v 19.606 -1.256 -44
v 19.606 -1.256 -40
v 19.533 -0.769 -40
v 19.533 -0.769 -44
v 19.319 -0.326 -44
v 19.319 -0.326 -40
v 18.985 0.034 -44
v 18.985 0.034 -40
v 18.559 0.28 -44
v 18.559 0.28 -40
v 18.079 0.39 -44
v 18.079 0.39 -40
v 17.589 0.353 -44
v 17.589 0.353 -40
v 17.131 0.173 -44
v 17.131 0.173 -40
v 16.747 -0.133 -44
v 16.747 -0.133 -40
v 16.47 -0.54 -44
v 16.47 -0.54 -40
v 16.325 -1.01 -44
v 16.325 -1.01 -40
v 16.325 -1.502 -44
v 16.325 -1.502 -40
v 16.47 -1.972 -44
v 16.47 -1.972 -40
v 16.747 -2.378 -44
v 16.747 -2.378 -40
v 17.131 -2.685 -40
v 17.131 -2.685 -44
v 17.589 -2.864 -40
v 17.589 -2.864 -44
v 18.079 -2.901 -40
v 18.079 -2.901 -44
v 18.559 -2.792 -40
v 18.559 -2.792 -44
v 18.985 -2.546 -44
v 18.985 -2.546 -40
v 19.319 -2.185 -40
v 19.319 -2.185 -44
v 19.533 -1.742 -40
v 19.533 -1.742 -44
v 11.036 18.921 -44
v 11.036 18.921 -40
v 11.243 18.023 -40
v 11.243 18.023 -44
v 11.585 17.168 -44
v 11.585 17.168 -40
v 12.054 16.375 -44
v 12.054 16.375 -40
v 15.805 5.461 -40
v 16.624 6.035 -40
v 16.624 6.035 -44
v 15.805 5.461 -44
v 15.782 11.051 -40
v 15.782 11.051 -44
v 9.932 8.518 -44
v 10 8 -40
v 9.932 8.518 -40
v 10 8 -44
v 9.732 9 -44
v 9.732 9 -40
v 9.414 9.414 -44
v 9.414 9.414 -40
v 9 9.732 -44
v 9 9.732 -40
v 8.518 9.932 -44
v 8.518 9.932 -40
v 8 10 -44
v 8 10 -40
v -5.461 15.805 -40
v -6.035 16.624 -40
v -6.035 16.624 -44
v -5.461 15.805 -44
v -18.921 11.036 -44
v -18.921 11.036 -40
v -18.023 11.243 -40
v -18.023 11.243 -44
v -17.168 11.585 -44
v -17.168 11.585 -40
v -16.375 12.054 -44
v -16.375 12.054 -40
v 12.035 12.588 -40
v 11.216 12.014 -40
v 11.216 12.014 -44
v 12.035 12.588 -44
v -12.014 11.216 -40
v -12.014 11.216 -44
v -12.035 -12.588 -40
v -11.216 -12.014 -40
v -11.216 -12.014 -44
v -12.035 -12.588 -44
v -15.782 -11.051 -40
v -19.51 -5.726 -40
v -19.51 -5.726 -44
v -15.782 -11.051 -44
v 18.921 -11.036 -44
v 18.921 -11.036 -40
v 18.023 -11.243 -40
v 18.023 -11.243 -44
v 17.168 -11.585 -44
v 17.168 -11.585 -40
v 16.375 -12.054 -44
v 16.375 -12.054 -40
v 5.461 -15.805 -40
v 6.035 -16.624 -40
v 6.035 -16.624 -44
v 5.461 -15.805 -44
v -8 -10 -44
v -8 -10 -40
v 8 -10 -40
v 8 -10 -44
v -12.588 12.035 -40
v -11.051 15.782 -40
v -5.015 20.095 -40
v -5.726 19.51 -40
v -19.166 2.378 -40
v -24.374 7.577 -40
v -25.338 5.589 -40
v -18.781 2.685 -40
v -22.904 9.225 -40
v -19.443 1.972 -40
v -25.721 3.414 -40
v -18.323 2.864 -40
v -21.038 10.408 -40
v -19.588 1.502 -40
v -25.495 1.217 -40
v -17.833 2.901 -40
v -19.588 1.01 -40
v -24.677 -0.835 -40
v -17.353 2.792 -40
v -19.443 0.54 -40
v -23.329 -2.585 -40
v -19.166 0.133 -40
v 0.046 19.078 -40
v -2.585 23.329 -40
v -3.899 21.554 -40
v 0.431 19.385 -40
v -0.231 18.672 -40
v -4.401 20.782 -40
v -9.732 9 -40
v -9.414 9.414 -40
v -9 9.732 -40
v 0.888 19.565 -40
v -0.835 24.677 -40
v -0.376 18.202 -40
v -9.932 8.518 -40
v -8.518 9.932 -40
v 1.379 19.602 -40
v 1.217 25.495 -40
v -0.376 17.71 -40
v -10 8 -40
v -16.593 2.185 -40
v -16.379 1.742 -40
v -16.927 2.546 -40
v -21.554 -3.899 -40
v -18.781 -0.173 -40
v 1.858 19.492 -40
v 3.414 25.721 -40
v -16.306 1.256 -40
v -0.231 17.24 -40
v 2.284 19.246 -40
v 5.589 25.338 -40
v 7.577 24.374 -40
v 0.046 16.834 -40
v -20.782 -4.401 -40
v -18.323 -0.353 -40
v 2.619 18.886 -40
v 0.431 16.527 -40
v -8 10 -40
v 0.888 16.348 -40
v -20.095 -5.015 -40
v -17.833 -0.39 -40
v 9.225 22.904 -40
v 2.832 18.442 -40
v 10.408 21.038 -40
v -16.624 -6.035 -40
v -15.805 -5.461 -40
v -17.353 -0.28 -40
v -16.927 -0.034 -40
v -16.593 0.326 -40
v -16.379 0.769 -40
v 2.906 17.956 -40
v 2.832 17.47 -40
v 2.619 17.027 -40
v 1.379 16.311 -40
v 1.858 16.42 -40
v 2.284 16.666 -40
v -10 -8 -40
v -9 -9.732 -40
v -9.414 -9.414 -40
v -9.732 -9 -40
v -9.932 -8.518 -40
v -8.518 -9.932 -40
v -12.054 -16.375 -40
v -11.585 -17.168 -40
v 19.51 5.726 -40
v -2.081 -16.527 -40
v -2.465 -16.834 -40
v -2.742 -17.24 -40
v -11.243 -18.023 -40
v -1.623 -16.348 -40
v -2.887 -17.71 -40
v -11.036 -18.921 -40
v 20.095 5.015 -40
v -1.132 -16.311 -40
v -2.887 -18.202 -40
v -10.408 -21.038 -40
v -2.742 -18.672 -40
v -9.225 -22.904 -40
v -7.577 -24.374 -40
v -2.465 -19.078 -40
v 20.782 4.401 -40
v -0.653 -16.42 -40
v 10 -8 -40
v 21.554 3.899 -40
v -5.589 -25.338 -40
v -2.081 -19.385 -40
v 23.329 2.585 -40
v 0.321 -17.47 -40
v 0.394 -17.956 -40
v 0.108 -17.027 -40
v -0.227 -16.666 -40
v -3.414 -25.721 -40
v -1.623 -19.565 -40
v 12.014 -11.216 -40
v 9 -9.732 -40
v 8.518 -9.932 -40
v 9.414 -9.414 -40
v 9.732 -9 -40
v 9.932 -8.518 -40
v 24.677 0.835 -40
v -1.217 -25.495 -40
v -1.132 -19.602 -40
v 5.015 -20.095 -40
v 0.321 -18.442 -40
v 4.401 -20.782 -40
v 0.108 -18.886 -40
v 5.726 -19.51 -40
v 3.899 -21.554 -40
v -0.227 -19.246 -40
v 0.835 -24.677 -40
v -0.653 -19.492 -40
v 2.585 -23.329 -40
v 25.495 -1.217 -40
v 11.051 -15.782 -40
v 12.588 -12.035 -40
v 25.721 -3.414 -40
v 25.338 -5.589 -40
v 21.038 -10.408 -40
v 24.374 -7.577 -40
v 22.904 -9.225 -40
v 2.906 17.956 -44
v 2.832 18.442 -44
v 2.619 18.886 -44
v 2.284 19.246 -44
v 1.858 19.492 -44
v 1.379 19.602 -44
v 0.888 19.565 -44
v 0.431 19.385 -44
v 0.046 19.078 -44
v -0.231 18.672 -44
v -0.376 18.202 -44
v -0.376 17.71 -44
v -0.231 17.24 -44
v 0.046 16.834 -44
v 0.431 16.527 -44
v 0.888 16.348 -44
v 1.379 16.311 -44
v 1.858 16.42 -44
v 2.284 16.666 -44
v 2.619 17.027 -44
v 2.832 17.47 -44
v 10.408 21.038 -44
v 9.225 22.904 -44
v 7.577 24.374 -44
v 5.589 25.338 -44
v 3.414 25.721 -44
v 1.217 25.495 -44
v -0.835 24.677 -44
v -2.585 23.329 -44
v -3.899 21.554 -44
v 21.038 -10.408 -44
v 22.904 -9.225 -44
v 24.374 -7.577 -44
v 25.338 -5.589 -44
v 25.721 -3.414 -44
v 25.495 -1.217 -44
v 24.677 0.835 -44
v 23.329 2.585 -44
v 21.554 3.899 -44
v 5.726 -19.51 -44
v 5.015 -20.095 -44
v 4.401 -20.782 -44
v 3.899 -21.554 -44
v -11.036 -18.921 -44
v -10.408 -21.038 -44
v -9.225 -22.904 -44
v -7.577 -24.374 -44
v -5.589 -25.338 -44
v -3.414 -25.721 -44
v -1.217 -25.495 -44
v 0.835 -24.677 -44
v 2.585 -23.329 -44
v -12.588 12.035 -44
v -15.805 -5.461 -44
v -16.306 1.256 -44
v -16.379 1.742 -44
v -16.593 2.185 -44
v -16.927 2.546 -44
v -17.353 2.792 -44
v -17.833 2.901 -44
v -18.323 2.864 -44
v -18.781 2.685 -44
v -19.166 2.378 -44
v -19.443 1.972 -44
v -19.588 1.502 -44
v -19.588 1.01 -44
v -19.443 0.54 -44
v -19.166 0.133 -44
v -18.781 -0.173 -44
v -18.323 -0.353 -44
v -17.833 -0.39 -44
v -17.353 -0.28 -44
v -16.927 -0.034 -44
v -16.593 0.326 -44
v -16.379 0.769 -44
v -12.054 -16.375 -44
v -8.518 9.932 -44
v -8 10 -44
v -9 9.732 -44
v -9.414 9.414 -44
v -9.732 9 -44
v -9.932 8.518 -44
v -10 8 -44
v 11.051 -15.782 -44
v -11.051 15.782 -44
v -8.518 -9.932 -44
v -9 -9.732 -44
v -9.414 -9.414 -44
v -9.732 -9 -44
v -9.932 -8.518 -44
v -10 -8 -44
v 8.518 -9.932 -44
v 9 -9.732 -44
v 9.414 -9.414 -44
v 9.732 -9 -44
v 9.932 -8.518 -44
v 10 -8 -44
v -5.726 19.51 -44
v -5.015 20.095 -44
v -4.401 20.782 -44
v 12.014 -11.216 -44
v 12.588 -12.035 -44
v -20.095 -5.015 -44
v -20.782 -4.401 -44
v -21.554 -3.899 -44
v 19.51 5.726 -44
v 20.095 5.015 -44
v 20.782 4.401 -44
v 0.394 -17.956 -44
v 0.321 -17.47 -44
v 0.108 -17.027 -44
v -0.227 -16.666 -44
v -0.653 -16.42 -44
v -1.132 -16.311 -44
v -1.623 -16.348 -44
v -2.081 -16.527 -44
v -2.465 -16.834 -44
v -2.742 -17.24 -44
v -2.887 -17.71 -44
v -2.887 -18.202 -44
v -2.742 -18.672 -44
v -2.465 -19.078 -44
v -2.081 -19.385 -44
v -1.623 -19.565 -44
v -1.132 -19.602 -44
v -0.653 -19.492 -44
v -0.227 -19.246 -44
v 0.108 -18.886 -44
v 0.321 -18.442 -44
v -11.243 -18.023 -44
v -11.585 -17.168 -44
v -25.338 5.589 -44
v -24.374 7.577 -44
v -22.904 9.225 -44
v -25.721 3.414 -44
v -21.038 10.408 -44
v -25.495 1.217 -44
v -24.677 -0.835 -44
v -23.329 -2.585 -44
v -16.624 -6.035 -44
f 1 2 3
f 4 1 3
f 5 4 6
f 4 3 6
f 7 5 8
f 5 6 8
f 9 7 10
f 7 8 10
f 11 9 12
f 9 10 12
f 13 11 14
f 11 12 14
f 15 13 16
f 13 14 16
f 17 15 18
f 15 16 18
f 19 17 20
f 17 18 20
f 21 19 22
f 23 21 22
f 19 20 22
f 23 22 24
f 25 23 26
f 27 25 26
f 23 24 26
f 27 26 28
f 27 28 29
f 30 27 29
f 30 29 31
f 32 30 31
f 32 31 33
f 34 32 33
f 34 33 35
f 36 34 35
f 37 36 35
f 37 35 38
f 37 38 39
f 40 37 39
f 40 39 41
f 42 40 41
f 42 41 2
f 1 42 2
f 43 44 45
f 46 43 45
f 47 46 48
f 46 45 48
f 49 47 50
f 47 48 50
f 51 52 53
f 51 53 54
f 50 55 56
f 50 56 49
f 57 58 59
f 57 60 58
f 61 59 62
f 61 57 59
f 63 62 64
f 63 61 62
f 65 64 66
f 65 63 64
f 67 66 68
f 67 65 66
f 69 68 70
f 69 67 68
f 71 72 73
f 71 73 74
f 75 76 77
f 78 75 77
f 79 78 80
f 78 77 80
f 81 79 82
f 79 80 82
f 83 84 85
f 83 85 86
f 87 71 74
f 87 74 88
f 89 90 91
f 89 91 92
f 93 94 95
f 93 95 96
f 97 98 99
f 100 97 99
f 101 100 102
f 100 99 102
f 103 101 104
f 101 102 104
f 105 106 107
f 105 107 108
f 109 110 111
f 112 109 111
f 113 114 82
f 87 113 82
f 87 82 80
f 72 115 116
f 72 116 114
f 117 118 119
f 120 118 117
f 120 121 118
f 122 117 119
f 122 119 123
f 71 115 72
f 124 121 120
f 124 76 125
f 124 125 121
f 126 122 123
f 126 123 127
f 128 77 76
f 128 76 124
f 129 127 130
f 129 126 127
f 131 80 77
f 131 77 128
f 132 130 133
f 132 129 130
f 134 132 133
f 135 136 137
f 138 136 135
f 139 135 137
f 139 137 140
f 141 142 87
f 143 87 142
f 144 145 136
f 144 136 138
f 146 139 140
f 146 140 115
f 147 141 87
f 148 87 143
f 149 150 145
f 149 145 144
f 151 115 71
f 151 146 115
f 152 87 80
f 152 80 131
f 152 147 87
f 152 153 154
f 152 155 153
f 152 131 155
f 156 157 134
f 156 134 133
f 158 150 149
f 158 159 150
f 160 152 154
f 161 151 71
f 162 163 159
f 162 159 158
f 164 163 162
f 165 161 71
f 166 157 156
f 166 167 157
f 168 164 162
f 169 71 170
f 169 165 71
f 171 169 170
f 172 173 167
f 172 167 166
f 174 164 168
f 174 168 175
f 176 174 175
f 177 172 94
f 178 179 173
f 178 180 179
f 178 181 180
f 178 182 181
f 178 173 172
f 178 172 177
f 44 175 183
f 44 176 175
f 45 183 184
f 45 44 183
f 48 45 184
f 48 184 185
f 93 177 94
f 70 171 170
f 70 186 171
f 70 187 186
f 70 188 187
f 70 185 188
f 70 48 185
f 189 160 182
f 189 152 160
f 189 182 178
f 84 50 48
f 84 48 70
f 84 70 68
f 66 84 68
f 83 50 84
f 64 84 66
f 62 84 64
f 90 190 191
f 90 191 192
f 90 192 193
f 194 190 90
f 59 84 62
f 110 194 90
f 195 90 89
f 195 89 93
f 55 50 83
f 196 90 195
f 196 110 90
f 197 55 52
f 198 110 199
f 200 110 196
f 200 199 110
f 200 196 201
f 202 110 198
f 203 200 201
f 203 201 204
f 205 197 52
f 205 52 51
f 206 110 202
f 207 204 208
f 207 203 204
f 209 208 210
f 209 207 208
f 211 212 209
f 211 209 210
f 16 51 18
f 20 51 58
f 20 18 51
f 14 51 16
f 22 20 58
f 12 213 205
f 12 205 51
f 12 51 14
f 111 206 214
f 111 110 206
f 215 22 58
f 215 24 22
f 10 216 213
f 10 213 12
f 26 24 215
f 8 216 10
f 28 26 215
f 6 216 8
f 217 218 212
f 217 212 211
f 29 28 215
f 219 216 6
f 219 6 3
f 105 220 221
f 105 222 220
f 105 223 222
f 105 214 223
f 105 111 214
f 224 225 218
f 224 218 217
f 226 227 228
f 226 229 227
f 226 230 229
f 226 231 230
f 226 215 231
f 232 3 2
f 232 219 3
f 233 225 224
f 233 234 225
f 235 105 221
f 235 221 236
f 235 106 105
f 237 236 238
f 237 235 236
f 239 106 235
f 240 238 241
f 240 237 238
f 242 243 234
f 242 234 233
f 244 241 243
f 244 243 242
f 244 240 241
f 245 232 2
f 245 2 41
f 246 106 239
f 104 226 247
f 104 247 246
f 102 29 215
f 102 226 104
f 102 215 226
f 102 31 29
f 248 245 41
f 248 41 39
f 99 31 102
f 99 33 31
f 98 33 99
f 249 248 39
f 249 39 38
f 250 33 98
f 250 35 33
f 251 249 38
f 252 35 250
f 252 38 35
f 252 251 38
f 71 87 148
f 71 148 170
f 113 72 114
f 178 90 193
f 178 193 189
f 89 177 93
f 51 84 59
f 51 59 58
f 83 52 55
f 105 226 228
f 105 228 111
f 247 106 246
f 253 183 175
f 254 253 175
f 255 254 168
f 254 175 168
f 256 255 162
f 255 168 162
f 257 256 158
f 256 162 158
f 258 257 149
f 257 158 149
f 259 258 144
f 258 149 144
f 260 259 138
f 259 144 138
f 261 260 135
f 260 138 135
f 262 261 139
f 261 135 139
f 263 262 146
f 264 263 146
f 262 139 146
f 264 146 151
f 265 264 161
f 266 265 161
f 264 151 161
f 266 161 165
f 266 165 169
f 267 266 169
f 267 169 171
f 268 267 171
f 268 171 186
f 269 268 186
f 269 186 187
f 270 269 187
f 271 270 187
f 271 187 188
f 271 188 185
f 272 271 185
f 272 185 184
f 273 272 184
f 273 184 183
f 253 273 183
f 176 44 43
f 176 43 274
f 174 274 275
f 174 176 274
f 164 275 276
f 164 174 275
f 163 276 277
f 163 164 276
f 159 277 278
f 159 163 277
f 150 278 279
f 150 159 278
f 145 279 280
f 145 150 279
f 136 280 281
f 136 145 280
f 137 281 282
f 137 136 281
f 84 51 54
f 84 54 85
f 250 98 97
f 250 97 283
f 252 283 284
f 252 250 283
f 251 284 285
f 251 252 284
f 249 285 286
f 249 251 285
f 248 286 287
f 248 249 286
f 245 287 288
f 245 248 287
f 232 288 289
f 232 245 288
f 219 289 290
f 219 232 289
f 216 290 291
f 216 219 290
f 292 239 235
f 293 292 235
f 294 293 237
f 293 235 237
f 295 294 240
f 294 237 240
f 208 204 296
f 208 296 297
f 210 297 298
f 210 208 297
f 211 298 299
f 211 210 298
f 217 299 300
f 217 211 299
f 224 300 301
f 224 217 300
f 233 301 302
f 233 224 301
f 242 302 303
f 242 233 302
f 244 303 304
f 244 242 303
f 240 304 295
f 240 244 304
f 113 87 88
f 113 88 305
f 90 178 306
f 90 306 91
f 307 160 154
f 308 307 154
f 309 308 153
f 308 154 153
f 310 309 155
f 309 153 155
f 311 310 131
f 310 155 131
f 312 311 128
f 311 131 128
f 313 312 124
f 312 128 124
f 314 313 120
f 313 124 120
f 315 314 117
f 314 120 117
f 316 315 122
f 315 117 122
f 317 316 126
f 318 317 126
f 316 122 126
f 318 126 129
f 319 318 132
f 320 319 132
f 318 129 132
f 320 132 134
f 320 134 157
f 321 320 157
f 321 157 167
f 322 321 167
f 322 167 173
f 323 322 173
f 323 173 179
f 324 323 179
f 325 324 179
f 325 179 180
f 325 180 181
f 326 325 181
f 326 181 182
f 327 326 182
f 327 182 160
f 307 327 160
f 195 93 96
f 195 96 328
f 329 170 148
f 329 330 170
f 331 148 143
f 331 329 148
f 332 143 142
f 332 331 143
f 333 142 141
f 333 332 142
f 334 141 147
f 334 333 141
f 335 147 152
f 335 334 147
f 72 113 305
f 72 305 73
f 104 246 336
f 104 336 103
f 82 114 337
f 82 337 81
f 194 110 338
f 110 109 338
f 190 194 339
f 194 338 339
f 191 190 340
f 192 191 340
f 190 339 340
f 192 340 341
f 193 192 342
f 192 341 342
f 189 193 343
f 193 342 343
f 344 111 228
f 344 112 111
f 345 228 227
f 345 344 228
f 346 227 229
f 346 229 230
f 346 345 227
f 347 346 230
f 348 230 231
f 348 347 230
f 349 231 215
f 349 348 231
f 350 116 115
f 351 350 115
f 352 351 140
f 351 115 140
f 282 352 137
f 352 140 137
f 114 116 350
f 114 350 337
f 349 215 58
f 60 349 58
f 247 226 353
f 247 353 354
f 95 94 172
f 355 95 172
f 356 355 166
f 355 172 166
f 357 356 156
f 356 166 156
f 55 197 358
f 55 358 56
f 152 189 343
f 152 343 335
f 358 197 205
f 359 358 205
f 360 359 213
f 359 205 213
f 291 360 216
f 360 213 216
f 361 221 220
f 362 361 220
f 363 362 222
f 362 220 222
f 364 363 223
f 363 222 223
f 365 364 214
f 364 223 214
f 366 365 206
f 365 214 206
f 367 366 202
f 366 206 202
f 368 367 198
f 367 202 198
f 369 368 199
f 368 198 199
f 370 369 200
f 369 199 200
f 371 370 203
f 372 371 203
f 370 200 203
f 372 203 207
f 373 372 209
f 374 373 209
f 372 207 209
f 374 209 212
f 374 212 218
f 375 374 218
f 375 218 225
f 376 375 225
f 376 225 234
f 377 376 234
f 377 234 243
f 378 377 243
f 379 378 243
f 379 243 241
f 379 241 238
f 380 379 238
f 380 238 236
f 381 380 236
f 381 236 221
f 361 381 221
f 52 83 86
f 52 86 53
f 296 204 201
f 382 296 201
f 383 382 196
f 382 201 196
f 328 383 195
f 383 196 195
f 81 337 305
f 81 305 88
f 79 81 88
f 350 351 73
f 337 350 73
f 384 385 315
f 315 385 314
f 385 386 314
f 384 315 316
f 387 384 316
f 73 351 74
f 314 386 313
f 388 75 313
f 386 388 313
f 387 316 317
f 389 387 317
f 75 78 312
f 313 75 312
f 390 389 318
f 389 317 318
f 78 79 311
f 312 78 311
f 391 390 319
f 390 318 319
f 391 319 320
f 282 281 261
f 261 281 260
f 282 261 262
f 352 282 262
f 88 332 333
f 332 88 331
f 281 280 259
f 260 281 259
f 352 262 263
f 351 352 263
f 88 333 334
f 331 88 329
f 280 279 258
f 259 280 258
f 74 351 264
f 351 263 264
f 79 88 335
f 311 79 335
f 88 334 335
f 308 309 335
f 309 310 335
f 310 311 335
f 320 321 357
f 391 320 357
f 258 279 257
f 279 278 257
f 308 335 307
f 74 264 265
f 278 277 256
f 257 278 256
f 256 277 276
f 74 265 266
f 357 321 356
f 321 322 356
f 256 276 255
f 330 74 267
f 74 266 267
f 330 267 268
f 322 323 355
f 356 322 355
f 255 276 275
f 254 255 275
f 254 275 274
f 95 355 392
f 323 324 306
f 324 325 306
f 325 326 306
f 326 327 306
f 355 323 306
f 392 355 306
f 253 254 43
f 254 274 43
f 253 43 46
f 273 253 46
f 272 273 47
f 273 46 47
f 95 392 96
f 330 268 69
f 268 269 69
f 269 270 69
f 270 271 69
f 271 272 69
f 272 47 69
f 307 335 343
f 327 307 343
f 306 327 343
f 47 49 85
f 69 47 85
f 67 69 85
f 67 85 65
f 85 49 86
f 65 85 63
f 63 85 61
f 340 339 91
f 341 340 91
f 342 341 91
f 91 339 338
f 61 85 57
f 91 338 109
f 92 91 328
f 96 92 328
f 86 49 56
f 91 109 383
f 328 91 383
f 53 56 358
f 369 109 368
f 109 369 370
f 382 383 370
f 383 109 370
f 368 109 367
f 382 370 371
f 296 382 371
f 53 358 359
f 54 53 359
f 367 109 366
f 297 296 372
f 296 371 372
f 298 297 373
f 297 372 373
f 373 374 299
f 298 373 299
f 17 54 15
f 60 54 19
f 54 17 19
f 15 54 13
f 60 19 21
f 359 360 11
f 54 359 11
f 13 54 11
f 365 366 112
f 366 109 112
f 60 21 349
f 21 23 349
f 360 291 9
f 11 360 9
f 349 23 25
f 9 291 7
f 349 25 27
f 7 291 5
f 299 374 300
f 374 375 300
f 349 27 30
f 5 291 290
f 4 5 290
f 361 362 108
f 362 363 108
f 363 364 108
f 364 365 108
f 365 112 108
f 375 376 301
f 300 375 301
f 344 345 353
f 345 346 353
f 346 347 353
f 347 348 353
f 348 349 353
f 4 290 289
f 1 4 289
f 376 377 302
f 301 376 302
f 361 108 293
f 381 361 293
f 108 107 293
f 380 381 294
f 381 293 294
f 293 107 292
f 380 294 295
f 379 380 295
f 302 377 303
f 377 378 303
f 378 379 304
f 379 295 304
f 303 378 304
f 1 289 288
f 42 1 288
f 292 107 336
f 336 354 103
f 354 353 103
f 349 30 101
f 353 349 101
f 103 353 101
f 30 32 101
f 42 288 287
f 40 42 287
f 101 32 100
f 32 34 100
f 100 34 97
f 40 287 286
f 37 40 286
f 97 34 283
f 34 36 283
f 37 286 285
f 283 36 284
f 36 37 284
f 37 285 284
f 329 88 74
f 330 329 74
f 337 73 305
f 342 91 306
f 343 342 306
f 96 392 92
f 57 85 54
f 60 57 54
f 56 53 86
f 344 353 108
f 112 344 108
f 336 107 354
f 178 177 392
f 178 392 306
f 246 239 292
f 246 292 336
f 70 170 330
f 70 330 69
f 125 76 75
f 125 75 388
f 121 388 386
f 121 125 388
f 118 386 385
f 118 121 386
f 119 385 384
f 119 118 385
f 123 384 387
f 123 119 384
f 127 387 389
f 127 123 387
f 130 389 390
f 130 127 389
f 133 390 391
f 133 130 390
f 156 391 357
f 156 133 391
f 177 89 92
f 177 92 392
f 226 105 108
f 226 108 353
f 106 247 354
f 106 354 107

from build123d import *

# Parameters (mm, degrees)
PAD009_DEPTH          = 4
POLARPATTERN003_COUNT = 4
SKETCH018_R           = 1.65
HOLE003_DEPTH         = 25
POCKET006_DEPTH       = 149.7520027338
POLARPATTERN001_COUNT = 4
SKETCH024_W           = 20
SKETCH024_H           = 20
POCKET007_DEPTH       = 4.001
FILLET_R              = 2


with BuildPart() as part:
    # Sketch → Pad009 (new body)
    with BuildSketch(Plane.XY):
        with BuildLine():
            ThreePointArc((18.9209111487, -11.036007045), (25.6050015783, -4.5148526193), (21.5543772962, 3.8991216402))
            ThreePointArc((19.510343337, 5.7262546507), (20.4266011455, 4.694374188), (21.5543772962, 3.8991216402))
            Line((19.510343337, 5.7262546507), (15.7820965007, 11.0507429386))
            Line((0, 0), (15.7820965007, 11.0507429386))
            Line((0, 0), (11.0507429386, -15.7820965007))
            Line((11.0507429386, -15.7820965007), (16.3752312264, -12.0538496644))
            ThreePointArc((18.9209111487, -11.036007045), (17.5891558316, -11.3975778351), (16.3752312264, -12.0538496644))
        make_face()
    pad009 = extrude(amount=-PAD009_DEPTH)

    # PolarPattern003: Pad009 ×4 about axis
    polarpattern003_axis = Axis((0, 0, 0), (0, 0, 1))
    for i in range(1, POLARPATTERN003_COUNT):
        add(pad009.rotate(polarpattern003_axis, i * 360 / POLARPATTERN003_COUNT))

    # Sketch018 → Hole003 (cut)
    with BuildSketch(Plane.XY.offset(8)):
        with Locations((1.2556165274, 17.9561529047)):
            Circle(SKETCH018_R)
        with Locations((-1.2556165274, -17.9561529047)):
            Circle(SKETCH018_R)
        with Locations((-17.9561529047, 1.2556165274)):
            Circle(SKETCH018_R)
        with Locations((17.9561529047, -1.2556165274)):
            Circle(SKETCH018_R)
    extrude(amount=-HOLE003_DEPTH, mode=Mode.SUBTRACT)

    # Sketch021 → Pocket006 (cut, through all)
    with BuildSketch(Plane.XY):
        Polygon((11.2159688683, 12.0143126733), (12.0351209126, 12.5878891096), (16.6237324034, 6.0346727553), (15.8045803591, 5.461096319), align=None)
    pocket006 = extrude(amount=-POCKET006_DEPTH, mode=Mode.SUBTRACT)

    # PolarPattern001: Pocket006 ×4 about axis
    polarpattern001_axis = Axis((0, 0, 0), (0, 0, 1))
    for i in range(1, POLARPATTERN001_COUNT):
        add(pocket006.rotate(polarpattern001_axis, i * 360 / POLARPATTERN001_COUNT), mode=Mode.SUBTRACT)

    # Sketch024 → Pocket007 (cut, through all)
    with BuildSketch(Plane.XY):
        Rectangle(SKETCH024_W, SKETCH024_H)
    extrude(amount=-POCKET007_DEPTH, mode=Mode.SUBTRACT)

    # Fillet
    fillet_edges = [part.edges().sort_by_distance(p)[0] for p in [
        (10, -10, -2),
        (-10, -10, -2),
        (-10, 10, -2),
        (10, 10, -2),
    ]]
    fillet(fillet_edges, radius=FILLET_R)


with BuildPart() as part_1:
    # Body004024 placement: moved
    add(part.part.moved(Location((0, 0, -40))))


solid = part_1.part
